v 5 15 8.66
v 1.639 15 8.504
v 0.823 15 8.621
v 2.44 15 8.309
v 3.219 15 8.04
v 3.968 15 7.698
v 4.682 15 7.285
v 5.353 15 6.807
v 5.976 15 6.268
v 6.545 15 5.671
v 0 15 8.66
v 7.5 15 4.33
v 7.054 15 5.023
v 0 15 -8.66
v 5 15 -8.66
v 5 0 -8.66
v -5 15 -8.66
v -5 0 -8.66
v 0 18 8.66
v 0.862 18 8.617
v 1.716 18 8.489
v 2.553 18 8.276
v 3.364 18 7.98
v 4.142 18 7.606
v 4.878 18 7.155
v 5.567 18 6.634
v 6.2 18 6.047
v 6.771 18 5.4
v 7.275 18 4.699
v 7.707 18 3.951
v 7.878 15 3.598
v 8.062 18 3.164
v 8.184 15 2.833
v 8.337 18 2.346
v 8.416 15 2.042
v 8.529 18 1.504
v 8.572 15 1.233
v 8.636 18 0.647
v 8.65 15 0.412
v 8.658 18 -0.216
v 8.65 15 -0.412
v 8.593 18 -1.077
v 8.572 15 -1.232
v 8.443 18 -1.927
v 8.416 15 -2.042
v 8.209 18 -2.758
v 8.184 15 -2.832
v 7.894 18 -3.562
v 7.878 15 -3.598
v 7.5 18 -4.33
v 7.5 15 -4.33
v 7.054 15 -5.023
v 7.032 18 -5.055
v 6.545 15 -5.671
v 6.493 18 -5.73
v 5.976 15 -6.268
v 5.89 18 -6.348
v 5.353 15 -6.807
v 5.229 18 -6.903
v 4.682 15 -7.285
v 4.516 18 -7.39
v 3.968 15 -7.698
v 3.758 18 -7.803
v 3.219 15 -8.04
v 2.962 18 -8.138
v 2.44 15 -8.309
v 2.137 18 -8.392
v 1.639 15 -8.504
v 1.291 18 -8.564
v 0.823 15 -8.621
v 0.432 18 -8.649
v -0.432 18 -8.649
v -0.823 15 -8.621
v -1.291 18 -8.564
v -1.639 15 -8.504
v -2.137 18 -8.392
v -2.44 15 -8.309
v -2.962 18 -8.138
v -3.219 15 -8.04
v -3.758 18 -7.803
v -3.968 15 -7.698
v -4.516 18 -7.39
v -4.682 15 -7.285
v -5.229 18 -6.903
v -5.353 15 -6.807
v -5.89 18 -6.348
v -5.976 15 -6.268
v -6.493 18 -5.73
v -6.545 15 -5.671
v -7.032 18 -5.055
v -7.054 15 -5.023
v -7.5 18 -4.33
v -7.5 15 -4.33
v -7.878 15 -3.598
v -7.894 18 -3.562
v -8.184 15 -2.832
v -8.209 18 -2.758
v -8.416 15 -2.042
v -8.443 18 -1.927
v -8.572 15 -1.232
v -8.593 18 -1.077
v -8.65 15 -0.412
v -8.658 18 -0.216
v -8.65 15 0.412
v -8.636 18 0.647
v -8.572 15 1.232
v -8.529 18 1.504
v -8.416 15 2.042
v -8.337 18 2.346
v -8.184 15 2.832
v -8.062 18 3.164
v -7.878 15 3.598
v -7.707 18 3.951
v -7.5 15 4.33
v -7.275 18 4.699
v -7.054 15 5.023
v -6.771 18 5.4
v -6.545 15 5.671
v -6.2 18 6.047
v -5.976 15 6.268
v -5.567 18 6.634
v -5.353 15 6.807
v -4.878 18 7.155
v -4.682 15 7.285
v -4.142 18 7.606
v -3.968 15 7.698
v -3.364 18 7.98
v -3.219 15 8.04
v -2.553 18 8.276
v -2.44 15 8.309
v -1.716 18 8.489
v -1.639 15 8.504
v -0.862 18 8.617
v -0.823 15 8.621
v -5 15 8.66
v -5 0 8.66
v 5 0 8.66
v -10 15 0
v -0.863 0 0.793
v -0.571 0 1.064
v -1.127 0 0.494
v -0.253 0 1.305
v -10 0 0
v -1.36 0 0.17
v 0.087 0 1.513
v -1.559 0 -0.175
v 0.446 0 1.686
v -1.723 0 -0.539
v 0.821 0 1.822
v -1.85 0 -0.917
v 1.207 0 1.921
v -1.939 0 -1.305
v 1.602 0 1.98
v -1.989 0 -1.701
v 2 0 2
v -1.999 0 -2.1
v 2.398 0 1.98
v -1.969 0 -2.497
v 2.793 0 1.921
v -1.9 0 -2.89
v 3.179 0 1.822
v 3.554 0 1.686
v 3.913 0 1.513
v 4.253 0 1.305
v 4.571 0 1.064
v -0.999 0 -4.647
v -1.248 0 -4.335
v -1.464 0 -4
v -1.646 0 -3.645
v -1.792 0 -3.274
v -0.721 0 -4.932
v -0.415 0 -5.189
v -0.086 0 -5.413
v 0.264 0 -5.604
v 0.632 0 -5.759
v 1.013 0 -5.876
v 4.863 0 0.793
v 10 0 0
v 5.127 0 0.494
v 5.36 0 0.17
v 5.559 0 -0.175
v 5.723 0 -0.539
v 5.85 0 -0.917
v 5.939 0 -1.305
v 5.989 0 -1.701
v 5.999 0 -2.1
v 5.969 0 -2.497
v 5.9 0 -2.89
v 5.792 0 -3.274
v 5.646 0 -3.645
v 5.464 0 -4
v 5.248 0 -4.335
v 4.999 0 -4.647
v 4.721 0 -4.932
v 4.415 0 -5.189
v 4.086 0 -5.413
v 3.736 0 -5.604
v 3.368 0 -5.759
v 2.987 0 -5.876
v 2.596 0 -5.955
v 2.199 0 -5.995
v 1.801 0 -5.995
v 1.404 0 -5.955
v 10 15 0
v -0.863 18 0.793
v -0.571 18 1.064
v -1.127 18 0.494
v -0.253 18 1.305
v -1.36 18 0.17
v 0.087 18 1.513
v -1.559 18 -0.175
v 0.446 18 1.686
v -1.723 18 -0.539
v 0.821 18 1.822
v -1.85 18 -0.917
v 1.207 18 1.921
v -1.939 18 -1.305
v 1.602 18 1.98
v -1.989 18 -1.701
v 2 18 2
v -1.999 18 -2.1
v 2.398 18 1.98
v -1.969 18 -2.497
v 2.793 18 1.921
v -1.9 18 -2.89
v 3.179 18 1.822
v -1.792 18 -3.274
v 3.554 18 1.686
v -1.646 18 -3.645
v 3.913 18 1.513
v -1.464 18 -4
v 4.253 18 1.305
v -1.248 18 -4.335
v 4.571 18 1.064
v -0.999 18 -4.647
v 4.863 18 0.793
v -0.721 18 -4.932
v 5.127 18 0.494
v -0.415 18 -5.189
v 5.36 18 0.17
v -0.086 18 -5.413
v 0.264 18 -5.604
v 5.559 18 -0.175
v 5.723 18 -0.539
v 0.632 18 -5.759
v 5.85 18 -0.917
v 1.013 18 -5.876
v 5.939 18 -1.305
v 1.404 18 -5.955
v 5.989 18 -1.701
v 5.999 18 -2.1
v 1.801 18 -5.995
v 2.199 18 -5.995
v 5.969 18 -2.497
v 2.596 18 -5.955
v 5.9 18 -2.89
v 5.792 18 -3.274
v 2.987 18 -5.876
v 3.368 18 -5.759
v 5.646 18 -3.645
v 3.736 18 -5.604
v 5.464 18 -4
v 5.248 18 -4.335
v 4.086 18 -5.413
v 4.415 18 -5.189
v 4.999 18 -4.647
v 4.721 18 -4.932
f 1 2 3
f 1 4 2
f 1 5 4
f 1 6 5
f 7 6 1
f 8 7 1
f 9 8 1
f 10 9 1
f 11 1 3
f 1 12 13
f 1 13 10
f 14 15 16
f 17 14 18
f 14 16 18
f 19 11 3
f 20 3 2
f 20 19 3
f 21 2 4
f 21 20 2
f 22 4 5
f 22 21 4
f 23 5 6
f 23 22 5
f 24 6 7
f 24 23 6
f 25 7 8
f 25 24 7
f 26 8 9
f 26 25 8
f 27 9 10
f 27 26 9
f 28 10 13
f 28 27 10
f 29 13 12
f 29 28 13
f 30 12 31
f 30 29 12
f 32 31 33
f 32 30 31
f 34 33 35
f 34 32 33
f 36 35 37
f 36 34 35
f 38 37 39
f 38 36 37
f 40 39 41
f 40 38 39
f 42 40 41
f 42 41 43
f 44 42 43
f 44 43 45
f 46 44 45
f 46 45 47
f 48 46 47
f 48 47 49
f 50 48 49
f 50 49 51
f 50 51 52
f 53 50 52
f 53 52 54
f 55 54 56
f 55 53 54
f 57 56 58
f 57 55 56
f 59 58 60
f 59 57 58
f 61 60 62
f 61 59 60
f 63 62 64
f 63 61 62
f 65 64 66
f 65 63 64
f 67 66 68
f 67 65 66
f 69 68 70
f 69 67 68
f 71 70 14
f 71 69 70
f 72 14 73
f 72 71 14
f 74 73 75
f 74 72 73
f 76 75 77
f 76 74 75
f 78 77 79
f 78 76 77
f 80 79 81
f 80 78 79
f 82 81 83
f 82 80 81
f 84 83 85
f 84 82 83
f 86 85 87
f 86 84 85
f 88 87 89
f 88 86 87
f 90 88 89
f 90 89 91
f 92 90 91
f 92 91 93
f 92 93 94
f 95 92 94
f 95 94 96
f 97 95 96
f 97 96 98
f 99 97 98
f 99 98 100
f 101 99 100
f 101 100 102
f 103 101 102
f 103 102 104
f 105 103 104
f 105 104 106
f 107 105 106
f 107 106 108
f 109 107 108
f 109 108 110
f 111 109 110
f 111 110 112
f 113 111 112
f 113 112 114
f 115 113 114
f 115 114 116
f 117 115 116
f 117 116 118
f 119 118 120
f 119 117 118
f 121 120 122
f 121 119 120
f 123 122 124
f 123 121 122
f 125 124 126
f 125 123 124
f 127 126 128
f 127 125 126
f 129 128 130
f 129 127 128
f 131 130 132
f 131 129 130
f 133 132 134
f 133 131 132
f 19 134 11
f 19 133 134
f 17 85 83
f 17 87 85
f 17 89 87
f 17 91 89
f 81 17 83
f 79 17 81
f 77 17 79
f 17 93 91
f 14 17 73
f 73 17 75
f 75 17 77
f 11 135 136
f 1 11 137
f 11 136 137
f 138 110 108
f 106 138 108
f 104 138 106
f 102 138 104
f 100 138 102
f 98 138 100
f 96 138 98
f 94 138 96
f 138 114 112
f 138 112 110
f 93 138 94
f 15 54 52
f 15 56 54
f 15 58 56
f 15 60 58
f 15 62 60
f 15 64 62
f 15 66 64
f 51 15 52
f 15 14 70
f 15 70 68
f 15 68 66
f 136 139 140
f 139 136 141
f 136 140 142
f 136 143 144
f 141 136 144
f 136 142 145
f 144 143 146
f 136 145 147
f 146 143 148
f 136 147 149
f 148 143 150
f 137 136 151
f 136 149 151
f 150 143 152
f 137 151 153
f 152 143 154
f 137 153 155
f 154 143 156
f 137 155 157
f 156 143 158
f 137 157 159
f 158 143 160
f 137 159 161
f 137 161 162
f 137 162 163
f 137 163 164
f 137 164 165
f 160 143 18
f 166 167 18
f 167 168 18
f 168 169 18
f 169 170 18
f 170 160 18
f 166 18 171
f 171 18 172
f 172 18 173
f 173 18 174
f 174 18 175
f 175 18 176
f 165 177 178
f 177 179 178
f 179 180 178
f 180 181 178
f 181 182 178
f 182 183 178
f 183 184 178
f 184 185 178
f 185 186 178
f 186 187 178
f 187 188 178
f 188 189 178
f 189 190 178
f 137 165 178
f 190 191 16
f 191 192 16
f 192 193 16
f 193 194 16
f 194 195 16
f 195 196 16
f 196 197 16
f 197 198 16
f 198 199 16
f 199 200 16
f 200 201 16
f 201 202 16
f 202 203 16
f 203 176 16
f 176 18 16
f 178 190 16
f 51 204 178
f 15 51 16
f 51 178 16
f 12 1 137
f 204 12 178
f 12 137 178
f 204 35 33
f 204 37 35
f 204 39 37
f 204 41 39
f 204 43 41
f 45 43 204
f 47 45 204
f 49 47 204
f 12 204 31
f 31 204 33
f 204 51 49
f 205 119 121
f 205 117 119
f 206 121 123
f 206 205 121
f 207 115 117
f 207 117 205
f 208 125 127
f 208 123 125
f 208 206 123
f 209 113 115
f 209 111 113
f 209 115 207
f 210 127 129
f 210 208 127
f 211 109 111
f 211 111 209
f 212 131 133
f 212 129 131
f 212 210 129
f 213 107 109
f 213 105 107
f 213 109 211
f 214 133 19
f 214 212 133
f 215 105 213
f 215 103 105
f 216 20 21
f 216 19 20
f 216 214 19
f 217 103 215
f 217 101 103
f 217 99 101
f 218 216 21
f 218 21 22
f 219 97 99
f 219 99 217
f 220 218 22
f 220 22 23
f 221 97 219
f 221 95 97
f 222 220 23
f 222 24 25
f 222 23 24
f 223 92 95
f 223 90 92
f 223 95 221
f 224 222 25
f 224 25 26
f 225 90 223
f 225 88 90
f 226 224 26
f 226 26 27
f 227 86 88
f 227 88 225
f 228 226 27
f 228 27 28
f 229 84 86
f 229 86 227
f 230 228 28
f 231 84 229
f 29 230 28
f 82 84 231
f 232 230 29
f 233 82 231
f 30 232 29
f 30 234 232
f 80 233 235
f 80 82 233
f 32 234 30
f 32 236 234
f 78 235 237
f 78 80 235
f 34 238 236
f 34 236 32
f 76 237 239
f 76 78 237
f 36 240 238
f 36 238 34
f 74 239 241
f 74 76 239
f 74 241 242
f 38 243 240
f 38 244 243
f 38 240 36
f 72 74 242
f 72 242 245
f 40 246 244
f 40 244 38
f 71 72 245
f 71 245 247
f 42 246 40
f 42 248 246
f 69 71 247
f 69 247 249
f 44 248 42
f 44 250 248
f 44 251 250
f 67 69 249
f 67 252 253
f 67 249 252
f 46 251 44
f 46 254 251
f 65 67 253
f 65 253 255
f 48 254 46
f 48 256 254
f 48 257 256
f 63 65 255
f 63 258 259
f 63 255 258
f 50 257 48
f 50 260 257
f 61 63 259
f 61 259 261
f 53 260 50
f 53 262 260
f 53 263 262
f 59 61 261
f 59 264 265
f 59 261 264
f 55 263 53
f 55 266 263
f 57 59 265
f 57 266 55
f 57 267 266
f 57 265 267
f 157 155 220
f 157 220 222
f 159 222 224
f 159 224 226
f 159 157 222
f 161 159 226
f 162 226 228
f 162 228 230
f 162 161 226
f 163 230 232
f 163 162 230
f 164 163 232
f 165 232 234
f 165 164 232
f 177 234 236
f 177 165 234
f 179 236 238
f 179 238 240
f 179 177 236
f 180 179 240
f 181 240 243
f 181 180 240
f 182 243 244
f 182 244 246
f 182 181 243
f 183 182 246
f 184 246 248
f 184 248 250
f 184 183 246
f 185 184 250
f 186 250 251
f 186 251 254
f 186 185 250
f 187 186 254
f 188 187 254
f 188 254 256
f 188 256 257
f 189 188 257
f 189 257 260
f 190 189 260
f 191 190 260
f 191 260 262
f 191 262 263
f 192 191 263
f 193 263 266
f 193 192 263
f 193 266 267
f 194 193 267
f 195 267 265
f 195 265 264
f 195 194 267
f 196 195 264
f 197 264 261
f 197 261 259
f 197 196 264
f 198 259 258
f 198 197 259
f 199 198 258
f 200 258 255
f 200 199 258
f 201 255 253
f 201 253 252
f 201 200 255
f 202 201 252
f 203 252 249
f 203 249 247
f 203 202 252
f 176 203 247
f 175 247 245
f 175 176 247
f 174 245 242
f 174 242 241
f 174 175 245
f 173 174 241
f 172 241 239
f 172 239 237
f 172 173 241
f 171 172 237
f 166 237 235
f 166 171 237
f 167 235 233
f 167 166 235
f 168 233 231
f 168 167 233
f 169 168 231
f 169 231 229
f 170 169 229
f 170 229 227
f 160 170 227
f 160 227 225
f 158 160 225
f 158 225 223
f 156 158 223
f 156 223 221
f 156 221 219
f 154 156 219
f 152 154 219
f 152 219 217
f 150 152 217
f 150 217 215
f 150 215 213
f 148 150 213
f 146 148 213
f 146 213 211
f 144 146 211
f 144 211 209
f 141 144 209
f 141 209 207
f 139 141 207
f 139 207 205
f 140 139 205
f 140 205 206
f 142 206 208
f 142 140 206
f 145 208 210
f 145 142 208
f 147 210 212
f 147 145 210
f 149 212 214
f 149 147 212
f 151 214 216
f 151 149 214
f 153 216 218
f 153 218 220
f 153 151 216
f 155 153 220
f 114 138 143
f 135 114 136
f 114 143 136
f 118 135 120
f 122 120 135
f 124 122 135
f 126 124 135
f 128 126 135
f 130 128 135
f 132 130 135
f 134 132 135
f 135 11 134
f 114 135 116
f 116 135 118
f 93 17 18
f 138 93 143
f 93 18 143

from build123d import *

# Parameters (mm, degrees)
SKETCH1_R           = 4
BOSS_EXTRUDE1_DEPTH = 18
SKETCH3_R           = 13.976554855
SKETCH3_R_2         = 8.660254038
CUT_EXTRUDE1_DEPTH  = 3


with BuildPart() as part:
    # Sketch1 → Boss-Extrude1 (new body)
    with BuildSketch(Plane(origin=(0, 0, 0), x_dir=(1, 0, 0), z_dir=(0, 1, 0))):
        Polygon((10, 0), (5, 8.660254038), (-5, 8.660254038), (-10, 0), (-5, -8.660254038), (5, -8.660254038), align=None)
        with Locations(Location((2, 2, 0), (0, 0, 270))):
            Circle(SKETCH1_R, mode=Mode.SUBTRACT)
    extrude(amount=BOSS_EXTRUDE1_DEPTH)

    # Sketch3 → Cut-Extrude1 (cut)
    with BuildSketch(Plane(origin=(0, 18, 0), x_dir=(1, 0, 0), z_dir=(0, 1, 0))):
        Circle(SKETCH3_R)
        with Locations(Location((0, 0, 0), (0, 0, 270))):
            Circle(SKETCH3_R_2, mode=Mode.SUBTRACT)
    extrude(amount=-CUT_EXTRUDE1_DEPTH, mode=Mode.SUBTRACT)


solid = part.part
